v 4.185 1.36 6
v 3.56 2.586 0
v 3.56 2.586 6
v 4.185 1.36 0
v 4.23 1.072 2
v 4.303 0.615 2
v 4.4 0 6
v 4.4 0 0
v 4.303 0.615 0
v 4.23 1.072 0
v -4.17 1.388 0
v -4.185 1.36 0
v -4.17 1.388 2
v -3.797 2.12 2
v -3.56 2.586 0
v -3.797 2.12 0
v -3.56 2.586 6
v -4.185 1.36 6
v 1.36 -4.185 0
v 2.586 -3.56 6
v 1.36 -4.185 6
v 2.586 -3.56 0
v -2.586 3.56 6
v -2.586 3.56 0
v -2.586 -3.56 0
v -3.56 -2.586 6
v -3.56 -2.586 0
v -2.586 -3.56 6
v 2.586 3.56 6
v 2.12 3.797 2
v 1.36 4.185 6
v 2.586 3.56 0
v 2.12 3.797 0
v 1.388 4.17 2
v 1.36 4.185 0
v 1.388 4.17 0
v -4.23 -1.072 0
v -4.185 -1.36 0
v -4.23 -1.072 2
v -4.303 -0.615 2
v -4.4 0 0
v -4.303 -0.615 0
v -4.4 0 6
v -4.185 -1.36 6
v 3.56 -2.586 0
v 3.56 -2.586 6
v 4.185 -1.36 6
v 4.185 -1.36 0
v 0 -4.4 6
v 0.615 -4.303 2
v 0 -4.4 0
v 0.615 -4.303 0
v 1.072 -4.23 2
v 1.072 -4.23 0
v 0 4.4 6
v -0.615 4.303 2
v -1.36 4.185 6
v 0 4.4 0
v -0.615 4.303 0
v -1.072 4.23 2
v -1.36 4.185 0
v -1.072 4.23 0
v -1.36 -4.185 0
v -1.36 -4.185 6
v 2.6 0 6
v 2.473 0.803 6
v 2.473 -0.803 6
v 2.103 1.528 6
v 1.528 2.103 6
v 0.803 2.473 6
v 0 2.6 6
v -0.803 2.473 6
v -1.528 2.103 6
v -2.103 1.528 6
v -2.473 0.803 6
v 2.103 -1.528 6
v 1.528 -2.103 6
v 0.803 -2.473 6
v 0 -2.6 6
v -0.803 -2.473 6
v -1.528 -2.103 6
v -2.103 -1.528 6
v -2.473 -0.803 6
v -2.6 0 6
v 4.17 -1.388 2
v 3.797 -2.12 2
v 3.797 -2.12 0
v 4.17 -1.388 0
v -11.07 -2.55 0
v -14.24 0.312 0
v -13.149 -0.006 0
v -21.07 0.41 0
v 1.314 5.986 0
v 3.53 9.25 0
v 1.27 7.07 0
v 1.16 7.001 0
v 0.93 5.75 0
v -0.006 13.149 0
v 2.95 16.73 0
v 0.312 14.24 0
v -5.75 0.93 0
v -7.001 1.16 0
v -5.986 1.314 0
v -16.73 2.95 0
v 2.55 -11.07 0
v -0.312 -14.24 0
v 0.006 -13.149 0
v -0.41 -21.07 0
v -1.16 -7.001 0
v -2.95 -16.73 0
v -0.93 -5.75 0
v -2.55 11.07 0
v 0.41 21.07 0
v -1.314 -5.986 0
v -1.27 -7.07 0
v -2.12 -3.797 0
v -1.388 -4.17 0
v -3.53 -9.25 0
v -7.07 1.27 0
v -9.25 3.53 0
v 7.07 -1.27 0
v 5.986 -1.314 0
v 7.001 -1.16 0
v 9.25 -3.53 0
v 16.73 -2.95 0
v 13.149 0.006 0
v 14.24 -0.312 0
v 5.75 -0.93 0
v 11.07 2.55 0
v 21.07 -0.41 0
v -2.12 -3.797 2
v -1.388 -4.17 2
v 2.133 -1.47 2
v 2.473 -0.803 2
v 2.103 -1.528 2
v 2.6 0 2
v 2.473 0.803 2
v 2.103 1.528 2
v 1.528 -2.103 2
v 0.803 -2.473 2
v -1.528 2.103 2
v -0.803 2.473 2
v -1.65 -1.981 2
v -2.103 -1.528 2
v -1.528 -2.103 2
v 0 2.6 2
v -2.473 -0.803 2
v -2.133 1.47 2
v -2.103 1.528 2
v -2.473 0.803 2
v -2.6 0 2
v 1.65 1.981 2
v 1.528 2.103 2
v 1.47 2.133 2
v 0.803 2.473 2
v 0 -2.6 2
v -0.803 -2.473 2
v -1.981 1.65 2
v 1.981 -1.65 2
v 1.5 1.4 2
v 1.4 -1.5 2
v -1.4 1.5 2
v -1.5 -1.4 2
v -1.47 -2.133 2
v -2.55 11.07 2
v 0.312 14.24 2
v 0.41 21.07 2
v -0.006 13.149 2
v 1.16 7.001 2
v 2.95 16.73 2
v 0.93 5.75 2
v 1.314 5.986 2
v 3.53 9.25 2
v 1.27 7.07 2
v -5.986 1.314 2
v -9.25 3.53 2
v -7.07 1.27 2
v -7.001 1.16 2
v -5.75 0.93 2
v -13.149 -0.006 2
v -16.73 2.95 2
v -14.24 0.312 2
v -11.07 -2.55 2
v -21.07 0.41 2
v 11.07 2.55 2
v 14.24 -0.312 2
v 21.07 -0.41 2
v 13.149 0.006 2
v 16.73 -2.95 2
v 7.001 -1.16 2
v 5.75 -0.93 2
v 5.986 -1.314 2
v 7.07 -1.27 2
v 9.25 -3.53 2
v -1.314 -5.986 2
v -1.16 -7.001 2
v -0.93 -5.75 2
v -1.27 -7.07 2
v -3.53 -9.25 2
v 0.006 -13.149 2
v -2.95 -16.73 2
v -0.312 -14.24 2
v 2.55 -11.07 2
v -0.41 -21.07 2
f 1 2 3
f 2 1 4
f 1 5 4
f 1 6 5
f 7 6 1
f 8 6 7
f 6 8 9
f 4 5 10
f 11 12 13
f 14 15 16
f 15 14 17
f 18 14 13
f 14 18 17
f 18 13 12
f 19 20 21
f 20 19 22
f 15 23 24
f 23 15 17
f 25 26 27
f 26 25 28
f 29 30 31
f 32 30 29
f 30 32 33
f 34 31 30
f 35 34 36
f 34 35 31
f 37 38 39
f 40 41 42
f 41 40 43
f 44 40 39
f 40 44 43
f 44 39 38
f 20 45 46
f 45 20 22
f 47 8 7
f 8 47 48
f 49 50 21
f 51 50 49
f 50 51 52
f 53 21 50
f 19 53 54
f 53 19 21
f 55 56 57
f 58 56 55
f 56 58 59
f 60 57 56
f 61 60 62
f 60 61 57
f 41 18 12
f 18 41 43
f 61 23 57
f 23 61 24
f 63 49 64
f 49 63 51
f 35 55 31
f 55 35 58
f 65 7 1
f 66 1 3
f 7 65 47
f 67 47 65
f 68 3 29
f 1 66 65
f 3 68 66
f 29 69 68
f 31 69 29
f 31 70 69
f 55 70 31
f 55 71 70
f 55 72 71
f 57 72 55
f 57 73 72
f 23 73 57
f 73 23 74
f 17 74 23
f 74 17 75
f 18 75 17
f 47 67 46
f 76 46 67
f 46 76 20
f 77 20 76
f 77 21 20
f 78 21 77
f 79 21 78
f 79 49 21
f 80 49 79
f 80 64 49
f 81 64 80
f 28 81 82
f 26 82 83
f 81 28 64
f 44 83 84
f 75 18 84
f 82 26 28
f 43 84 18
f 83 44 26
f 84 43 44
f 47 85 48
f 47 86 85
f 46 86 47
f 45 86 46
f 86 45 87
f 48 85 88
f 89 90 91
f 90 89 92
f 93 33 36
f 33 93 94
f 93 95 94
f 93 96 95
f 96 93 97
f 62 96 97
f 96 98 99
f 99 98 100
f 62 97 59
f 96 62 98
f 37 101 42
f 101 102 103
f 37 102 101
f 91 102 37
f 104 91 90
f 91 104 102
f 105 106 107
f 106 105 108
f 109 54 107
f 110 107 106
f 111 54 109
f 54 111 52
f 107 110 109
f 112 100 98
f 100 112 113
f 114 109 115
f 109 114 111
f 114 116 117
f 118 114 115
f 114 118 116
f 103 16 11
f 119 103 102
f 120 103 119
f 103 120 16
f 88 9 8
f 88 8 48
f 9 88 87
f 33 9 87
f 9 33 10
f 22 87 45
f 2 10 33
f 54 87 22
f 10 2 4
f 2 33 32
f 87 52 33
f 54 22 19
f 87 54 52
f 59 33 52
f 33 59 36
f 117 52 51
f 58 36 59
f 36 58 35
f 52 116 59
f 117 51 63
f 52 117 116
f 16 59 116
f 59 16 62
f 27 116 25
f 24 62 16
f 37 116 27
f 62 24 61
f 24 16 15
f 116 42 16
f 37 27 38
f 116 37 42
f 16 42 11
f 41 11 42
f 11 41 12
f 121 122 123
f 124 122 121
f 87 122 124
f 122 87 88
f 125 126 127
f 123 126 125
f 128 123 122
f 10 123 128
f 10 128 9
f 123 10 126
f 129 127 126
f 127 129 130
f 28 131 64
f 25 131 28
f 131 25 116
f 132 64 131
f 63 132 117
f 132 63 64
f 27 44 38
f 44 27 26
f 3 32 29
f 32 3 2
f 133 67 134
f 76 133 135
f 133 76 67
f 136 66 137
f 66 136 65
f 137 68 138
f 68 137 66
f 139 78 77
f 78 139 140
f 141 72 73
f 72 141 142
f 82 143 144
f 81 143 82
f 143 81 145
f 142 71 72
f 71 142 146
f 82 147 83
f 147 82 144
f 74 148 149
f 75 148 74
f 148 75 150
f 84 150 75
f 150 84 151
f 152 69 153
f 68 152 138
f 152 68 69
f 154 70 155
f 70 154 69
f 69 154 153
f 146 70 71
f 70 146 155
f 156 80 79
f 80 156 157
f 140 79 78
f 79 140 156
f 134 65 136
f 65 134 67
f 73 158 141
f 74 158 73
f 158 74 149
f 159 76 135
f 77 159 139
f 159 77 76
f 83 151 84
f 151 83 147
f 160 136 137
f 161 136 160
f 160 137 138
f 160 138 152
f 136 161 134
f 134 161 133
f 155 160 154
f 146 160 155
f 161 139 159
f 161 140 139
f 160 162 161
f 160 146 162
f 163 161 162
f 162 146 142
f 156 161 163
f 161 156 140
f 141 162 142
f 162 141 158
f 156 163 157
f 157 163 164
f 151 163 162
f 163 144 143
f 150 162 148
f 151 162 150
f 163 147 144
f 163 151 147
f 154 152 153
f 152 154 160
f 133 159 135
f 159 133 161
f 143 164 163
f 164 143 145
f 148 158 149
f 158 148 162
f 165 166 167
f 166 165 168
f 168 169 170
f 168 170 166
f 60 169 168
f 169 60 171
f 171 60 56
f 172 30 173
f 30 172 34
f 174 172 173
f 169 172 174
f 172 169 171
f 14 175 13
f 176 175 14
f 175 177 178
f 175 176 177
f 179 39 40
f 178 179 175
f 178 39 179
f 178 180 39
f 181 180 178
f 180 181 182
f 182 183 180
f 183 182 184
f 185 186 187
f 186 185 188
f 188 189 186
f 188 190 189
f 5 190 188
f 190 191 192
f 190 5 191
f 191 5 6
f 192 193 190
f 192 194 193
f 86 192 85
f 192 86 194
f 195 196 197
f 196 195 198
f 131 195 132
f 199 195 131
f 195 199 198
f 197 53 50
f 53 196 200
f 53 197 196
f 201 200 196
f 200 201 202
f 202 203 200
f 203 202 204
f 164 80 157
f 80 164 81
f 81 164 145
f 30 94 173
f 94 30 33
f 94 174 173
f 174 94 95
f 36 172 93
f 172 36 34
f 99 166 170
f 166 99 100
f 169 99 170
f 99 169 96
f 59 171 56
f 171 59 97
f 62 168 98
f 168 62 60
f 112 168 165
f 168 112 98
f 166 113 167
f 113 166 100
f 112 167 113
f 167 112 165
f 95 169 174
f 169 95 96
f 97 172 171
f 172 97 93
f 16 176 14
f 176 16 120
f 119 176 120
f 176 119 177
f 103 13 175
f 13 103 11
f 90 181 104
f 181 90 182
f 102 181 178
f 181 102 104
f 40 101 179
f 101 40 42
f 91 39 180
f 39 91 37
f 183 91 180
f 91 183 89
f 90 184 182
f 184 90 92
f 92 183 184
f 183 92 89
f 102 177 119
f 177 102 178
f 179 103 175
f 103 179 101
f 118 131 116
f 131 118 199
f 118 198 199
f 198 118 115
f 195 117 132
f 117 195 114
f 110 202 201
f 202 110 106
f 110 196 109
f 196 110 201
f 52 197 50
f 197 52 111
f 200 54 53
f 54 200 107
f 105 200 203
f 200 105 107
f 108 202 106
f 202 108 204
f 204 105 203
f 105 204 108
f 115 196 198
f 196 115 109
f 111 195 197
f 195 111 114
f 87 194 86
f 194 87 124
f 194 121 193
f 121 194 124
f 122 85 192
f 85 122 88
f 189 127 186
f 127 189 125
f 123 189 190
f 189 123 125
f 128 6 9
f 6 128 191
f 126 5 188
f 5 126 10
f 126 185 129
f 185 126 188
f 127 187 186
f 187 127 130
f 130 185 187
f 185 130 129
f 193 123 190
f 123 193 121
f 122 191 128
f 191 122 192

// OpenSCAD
$fn = 20;
module thunder(){
  polyhedron(
    points = [
      [0, 0, 0],
      [2.03, 7.85, 0],
      [-0.23, 5.67, 0],
      [0, 0, 2],
      [2.03, 7.85, 2],
      [-0.23, 5.67, 2]
    ],
    triangles = [
      [0, 1, 2],
      [3, 5, 4],
      [0, 3, 4, 1],
      [1, 4, 5, 2],
      [2, 5, 3, 0]
    ]
  );
  polyhedron(
    points = [
      [-0.57, 4.35, 0],
      [1.45, 15.33, 0],
      [-1.4, 12.64, 0],
      [-2.62, 2.43, 0],
      [-0.57, 4.35, 2],
      [1.45, 15.33, 2],
      [-1.4, 12.64, 2],
      [-2.62, 2.43, 2]
    ],
    triangles = [
      [0, 1, 2, 3],
      [4, 7, 6, 5],
      [0, 4, 5, 1],
      [1, 5, 6, 2],
      [2, 6, 7, 3],
      [3, 7, 4, 0]
    ]
  );
    polyhedron(
    points = [
      [-1.2, 12, 0],
      [-1.09, 19.67, 0],
      [-4.05, 9.67, 0],
      [-1.2, 12, 2],
      [-1.09, 19.67, 2],
      [-4.05, 9.67, 2]
    ],
    triangles = [
      [0, 1, 2],
      [3, 5, 4],
      [0, 3, 4, 1],
      [1, 4, 5, 2],
      [2, 5, 3, 0]
    ]
  );
    polyhedron(
    points = [
      [0, 4.7, 0],
      [-0.23, 5.67, 0],
      [-0.5, 5.5, 0],
      [-0.57, 4.35, 0],
      [0, 4.7, 2],
      [-0.23, 5.67, 2],
      [-0.5, 5.5, 2],
      [-0.57, 4.35, 2]
    ],
    triangles = [
      [0, 1, 2, 3],
      [4, 7, 6, 5],
      [0, 4, 5, 1],
      [1, 5, 6, 2],
      [2, 6, 7, 3],
      [3, 7, 4, 0]
    ]
  );}

difference(){
  cylinder(r=4.4, h=6, center=false);
  translate([0,0,2])cylinder(r=2.6, h=6, center=false);
}
translate([1.5,1.4,0])thunder();
rotate([0,0,90])translate([1.5,1.4,0])thunder();
rotate([0,0,180])translate([1.5,1.4,0])thunder();
rotate([0,0,-90])translate([1.5,1.4,0])thunder();
